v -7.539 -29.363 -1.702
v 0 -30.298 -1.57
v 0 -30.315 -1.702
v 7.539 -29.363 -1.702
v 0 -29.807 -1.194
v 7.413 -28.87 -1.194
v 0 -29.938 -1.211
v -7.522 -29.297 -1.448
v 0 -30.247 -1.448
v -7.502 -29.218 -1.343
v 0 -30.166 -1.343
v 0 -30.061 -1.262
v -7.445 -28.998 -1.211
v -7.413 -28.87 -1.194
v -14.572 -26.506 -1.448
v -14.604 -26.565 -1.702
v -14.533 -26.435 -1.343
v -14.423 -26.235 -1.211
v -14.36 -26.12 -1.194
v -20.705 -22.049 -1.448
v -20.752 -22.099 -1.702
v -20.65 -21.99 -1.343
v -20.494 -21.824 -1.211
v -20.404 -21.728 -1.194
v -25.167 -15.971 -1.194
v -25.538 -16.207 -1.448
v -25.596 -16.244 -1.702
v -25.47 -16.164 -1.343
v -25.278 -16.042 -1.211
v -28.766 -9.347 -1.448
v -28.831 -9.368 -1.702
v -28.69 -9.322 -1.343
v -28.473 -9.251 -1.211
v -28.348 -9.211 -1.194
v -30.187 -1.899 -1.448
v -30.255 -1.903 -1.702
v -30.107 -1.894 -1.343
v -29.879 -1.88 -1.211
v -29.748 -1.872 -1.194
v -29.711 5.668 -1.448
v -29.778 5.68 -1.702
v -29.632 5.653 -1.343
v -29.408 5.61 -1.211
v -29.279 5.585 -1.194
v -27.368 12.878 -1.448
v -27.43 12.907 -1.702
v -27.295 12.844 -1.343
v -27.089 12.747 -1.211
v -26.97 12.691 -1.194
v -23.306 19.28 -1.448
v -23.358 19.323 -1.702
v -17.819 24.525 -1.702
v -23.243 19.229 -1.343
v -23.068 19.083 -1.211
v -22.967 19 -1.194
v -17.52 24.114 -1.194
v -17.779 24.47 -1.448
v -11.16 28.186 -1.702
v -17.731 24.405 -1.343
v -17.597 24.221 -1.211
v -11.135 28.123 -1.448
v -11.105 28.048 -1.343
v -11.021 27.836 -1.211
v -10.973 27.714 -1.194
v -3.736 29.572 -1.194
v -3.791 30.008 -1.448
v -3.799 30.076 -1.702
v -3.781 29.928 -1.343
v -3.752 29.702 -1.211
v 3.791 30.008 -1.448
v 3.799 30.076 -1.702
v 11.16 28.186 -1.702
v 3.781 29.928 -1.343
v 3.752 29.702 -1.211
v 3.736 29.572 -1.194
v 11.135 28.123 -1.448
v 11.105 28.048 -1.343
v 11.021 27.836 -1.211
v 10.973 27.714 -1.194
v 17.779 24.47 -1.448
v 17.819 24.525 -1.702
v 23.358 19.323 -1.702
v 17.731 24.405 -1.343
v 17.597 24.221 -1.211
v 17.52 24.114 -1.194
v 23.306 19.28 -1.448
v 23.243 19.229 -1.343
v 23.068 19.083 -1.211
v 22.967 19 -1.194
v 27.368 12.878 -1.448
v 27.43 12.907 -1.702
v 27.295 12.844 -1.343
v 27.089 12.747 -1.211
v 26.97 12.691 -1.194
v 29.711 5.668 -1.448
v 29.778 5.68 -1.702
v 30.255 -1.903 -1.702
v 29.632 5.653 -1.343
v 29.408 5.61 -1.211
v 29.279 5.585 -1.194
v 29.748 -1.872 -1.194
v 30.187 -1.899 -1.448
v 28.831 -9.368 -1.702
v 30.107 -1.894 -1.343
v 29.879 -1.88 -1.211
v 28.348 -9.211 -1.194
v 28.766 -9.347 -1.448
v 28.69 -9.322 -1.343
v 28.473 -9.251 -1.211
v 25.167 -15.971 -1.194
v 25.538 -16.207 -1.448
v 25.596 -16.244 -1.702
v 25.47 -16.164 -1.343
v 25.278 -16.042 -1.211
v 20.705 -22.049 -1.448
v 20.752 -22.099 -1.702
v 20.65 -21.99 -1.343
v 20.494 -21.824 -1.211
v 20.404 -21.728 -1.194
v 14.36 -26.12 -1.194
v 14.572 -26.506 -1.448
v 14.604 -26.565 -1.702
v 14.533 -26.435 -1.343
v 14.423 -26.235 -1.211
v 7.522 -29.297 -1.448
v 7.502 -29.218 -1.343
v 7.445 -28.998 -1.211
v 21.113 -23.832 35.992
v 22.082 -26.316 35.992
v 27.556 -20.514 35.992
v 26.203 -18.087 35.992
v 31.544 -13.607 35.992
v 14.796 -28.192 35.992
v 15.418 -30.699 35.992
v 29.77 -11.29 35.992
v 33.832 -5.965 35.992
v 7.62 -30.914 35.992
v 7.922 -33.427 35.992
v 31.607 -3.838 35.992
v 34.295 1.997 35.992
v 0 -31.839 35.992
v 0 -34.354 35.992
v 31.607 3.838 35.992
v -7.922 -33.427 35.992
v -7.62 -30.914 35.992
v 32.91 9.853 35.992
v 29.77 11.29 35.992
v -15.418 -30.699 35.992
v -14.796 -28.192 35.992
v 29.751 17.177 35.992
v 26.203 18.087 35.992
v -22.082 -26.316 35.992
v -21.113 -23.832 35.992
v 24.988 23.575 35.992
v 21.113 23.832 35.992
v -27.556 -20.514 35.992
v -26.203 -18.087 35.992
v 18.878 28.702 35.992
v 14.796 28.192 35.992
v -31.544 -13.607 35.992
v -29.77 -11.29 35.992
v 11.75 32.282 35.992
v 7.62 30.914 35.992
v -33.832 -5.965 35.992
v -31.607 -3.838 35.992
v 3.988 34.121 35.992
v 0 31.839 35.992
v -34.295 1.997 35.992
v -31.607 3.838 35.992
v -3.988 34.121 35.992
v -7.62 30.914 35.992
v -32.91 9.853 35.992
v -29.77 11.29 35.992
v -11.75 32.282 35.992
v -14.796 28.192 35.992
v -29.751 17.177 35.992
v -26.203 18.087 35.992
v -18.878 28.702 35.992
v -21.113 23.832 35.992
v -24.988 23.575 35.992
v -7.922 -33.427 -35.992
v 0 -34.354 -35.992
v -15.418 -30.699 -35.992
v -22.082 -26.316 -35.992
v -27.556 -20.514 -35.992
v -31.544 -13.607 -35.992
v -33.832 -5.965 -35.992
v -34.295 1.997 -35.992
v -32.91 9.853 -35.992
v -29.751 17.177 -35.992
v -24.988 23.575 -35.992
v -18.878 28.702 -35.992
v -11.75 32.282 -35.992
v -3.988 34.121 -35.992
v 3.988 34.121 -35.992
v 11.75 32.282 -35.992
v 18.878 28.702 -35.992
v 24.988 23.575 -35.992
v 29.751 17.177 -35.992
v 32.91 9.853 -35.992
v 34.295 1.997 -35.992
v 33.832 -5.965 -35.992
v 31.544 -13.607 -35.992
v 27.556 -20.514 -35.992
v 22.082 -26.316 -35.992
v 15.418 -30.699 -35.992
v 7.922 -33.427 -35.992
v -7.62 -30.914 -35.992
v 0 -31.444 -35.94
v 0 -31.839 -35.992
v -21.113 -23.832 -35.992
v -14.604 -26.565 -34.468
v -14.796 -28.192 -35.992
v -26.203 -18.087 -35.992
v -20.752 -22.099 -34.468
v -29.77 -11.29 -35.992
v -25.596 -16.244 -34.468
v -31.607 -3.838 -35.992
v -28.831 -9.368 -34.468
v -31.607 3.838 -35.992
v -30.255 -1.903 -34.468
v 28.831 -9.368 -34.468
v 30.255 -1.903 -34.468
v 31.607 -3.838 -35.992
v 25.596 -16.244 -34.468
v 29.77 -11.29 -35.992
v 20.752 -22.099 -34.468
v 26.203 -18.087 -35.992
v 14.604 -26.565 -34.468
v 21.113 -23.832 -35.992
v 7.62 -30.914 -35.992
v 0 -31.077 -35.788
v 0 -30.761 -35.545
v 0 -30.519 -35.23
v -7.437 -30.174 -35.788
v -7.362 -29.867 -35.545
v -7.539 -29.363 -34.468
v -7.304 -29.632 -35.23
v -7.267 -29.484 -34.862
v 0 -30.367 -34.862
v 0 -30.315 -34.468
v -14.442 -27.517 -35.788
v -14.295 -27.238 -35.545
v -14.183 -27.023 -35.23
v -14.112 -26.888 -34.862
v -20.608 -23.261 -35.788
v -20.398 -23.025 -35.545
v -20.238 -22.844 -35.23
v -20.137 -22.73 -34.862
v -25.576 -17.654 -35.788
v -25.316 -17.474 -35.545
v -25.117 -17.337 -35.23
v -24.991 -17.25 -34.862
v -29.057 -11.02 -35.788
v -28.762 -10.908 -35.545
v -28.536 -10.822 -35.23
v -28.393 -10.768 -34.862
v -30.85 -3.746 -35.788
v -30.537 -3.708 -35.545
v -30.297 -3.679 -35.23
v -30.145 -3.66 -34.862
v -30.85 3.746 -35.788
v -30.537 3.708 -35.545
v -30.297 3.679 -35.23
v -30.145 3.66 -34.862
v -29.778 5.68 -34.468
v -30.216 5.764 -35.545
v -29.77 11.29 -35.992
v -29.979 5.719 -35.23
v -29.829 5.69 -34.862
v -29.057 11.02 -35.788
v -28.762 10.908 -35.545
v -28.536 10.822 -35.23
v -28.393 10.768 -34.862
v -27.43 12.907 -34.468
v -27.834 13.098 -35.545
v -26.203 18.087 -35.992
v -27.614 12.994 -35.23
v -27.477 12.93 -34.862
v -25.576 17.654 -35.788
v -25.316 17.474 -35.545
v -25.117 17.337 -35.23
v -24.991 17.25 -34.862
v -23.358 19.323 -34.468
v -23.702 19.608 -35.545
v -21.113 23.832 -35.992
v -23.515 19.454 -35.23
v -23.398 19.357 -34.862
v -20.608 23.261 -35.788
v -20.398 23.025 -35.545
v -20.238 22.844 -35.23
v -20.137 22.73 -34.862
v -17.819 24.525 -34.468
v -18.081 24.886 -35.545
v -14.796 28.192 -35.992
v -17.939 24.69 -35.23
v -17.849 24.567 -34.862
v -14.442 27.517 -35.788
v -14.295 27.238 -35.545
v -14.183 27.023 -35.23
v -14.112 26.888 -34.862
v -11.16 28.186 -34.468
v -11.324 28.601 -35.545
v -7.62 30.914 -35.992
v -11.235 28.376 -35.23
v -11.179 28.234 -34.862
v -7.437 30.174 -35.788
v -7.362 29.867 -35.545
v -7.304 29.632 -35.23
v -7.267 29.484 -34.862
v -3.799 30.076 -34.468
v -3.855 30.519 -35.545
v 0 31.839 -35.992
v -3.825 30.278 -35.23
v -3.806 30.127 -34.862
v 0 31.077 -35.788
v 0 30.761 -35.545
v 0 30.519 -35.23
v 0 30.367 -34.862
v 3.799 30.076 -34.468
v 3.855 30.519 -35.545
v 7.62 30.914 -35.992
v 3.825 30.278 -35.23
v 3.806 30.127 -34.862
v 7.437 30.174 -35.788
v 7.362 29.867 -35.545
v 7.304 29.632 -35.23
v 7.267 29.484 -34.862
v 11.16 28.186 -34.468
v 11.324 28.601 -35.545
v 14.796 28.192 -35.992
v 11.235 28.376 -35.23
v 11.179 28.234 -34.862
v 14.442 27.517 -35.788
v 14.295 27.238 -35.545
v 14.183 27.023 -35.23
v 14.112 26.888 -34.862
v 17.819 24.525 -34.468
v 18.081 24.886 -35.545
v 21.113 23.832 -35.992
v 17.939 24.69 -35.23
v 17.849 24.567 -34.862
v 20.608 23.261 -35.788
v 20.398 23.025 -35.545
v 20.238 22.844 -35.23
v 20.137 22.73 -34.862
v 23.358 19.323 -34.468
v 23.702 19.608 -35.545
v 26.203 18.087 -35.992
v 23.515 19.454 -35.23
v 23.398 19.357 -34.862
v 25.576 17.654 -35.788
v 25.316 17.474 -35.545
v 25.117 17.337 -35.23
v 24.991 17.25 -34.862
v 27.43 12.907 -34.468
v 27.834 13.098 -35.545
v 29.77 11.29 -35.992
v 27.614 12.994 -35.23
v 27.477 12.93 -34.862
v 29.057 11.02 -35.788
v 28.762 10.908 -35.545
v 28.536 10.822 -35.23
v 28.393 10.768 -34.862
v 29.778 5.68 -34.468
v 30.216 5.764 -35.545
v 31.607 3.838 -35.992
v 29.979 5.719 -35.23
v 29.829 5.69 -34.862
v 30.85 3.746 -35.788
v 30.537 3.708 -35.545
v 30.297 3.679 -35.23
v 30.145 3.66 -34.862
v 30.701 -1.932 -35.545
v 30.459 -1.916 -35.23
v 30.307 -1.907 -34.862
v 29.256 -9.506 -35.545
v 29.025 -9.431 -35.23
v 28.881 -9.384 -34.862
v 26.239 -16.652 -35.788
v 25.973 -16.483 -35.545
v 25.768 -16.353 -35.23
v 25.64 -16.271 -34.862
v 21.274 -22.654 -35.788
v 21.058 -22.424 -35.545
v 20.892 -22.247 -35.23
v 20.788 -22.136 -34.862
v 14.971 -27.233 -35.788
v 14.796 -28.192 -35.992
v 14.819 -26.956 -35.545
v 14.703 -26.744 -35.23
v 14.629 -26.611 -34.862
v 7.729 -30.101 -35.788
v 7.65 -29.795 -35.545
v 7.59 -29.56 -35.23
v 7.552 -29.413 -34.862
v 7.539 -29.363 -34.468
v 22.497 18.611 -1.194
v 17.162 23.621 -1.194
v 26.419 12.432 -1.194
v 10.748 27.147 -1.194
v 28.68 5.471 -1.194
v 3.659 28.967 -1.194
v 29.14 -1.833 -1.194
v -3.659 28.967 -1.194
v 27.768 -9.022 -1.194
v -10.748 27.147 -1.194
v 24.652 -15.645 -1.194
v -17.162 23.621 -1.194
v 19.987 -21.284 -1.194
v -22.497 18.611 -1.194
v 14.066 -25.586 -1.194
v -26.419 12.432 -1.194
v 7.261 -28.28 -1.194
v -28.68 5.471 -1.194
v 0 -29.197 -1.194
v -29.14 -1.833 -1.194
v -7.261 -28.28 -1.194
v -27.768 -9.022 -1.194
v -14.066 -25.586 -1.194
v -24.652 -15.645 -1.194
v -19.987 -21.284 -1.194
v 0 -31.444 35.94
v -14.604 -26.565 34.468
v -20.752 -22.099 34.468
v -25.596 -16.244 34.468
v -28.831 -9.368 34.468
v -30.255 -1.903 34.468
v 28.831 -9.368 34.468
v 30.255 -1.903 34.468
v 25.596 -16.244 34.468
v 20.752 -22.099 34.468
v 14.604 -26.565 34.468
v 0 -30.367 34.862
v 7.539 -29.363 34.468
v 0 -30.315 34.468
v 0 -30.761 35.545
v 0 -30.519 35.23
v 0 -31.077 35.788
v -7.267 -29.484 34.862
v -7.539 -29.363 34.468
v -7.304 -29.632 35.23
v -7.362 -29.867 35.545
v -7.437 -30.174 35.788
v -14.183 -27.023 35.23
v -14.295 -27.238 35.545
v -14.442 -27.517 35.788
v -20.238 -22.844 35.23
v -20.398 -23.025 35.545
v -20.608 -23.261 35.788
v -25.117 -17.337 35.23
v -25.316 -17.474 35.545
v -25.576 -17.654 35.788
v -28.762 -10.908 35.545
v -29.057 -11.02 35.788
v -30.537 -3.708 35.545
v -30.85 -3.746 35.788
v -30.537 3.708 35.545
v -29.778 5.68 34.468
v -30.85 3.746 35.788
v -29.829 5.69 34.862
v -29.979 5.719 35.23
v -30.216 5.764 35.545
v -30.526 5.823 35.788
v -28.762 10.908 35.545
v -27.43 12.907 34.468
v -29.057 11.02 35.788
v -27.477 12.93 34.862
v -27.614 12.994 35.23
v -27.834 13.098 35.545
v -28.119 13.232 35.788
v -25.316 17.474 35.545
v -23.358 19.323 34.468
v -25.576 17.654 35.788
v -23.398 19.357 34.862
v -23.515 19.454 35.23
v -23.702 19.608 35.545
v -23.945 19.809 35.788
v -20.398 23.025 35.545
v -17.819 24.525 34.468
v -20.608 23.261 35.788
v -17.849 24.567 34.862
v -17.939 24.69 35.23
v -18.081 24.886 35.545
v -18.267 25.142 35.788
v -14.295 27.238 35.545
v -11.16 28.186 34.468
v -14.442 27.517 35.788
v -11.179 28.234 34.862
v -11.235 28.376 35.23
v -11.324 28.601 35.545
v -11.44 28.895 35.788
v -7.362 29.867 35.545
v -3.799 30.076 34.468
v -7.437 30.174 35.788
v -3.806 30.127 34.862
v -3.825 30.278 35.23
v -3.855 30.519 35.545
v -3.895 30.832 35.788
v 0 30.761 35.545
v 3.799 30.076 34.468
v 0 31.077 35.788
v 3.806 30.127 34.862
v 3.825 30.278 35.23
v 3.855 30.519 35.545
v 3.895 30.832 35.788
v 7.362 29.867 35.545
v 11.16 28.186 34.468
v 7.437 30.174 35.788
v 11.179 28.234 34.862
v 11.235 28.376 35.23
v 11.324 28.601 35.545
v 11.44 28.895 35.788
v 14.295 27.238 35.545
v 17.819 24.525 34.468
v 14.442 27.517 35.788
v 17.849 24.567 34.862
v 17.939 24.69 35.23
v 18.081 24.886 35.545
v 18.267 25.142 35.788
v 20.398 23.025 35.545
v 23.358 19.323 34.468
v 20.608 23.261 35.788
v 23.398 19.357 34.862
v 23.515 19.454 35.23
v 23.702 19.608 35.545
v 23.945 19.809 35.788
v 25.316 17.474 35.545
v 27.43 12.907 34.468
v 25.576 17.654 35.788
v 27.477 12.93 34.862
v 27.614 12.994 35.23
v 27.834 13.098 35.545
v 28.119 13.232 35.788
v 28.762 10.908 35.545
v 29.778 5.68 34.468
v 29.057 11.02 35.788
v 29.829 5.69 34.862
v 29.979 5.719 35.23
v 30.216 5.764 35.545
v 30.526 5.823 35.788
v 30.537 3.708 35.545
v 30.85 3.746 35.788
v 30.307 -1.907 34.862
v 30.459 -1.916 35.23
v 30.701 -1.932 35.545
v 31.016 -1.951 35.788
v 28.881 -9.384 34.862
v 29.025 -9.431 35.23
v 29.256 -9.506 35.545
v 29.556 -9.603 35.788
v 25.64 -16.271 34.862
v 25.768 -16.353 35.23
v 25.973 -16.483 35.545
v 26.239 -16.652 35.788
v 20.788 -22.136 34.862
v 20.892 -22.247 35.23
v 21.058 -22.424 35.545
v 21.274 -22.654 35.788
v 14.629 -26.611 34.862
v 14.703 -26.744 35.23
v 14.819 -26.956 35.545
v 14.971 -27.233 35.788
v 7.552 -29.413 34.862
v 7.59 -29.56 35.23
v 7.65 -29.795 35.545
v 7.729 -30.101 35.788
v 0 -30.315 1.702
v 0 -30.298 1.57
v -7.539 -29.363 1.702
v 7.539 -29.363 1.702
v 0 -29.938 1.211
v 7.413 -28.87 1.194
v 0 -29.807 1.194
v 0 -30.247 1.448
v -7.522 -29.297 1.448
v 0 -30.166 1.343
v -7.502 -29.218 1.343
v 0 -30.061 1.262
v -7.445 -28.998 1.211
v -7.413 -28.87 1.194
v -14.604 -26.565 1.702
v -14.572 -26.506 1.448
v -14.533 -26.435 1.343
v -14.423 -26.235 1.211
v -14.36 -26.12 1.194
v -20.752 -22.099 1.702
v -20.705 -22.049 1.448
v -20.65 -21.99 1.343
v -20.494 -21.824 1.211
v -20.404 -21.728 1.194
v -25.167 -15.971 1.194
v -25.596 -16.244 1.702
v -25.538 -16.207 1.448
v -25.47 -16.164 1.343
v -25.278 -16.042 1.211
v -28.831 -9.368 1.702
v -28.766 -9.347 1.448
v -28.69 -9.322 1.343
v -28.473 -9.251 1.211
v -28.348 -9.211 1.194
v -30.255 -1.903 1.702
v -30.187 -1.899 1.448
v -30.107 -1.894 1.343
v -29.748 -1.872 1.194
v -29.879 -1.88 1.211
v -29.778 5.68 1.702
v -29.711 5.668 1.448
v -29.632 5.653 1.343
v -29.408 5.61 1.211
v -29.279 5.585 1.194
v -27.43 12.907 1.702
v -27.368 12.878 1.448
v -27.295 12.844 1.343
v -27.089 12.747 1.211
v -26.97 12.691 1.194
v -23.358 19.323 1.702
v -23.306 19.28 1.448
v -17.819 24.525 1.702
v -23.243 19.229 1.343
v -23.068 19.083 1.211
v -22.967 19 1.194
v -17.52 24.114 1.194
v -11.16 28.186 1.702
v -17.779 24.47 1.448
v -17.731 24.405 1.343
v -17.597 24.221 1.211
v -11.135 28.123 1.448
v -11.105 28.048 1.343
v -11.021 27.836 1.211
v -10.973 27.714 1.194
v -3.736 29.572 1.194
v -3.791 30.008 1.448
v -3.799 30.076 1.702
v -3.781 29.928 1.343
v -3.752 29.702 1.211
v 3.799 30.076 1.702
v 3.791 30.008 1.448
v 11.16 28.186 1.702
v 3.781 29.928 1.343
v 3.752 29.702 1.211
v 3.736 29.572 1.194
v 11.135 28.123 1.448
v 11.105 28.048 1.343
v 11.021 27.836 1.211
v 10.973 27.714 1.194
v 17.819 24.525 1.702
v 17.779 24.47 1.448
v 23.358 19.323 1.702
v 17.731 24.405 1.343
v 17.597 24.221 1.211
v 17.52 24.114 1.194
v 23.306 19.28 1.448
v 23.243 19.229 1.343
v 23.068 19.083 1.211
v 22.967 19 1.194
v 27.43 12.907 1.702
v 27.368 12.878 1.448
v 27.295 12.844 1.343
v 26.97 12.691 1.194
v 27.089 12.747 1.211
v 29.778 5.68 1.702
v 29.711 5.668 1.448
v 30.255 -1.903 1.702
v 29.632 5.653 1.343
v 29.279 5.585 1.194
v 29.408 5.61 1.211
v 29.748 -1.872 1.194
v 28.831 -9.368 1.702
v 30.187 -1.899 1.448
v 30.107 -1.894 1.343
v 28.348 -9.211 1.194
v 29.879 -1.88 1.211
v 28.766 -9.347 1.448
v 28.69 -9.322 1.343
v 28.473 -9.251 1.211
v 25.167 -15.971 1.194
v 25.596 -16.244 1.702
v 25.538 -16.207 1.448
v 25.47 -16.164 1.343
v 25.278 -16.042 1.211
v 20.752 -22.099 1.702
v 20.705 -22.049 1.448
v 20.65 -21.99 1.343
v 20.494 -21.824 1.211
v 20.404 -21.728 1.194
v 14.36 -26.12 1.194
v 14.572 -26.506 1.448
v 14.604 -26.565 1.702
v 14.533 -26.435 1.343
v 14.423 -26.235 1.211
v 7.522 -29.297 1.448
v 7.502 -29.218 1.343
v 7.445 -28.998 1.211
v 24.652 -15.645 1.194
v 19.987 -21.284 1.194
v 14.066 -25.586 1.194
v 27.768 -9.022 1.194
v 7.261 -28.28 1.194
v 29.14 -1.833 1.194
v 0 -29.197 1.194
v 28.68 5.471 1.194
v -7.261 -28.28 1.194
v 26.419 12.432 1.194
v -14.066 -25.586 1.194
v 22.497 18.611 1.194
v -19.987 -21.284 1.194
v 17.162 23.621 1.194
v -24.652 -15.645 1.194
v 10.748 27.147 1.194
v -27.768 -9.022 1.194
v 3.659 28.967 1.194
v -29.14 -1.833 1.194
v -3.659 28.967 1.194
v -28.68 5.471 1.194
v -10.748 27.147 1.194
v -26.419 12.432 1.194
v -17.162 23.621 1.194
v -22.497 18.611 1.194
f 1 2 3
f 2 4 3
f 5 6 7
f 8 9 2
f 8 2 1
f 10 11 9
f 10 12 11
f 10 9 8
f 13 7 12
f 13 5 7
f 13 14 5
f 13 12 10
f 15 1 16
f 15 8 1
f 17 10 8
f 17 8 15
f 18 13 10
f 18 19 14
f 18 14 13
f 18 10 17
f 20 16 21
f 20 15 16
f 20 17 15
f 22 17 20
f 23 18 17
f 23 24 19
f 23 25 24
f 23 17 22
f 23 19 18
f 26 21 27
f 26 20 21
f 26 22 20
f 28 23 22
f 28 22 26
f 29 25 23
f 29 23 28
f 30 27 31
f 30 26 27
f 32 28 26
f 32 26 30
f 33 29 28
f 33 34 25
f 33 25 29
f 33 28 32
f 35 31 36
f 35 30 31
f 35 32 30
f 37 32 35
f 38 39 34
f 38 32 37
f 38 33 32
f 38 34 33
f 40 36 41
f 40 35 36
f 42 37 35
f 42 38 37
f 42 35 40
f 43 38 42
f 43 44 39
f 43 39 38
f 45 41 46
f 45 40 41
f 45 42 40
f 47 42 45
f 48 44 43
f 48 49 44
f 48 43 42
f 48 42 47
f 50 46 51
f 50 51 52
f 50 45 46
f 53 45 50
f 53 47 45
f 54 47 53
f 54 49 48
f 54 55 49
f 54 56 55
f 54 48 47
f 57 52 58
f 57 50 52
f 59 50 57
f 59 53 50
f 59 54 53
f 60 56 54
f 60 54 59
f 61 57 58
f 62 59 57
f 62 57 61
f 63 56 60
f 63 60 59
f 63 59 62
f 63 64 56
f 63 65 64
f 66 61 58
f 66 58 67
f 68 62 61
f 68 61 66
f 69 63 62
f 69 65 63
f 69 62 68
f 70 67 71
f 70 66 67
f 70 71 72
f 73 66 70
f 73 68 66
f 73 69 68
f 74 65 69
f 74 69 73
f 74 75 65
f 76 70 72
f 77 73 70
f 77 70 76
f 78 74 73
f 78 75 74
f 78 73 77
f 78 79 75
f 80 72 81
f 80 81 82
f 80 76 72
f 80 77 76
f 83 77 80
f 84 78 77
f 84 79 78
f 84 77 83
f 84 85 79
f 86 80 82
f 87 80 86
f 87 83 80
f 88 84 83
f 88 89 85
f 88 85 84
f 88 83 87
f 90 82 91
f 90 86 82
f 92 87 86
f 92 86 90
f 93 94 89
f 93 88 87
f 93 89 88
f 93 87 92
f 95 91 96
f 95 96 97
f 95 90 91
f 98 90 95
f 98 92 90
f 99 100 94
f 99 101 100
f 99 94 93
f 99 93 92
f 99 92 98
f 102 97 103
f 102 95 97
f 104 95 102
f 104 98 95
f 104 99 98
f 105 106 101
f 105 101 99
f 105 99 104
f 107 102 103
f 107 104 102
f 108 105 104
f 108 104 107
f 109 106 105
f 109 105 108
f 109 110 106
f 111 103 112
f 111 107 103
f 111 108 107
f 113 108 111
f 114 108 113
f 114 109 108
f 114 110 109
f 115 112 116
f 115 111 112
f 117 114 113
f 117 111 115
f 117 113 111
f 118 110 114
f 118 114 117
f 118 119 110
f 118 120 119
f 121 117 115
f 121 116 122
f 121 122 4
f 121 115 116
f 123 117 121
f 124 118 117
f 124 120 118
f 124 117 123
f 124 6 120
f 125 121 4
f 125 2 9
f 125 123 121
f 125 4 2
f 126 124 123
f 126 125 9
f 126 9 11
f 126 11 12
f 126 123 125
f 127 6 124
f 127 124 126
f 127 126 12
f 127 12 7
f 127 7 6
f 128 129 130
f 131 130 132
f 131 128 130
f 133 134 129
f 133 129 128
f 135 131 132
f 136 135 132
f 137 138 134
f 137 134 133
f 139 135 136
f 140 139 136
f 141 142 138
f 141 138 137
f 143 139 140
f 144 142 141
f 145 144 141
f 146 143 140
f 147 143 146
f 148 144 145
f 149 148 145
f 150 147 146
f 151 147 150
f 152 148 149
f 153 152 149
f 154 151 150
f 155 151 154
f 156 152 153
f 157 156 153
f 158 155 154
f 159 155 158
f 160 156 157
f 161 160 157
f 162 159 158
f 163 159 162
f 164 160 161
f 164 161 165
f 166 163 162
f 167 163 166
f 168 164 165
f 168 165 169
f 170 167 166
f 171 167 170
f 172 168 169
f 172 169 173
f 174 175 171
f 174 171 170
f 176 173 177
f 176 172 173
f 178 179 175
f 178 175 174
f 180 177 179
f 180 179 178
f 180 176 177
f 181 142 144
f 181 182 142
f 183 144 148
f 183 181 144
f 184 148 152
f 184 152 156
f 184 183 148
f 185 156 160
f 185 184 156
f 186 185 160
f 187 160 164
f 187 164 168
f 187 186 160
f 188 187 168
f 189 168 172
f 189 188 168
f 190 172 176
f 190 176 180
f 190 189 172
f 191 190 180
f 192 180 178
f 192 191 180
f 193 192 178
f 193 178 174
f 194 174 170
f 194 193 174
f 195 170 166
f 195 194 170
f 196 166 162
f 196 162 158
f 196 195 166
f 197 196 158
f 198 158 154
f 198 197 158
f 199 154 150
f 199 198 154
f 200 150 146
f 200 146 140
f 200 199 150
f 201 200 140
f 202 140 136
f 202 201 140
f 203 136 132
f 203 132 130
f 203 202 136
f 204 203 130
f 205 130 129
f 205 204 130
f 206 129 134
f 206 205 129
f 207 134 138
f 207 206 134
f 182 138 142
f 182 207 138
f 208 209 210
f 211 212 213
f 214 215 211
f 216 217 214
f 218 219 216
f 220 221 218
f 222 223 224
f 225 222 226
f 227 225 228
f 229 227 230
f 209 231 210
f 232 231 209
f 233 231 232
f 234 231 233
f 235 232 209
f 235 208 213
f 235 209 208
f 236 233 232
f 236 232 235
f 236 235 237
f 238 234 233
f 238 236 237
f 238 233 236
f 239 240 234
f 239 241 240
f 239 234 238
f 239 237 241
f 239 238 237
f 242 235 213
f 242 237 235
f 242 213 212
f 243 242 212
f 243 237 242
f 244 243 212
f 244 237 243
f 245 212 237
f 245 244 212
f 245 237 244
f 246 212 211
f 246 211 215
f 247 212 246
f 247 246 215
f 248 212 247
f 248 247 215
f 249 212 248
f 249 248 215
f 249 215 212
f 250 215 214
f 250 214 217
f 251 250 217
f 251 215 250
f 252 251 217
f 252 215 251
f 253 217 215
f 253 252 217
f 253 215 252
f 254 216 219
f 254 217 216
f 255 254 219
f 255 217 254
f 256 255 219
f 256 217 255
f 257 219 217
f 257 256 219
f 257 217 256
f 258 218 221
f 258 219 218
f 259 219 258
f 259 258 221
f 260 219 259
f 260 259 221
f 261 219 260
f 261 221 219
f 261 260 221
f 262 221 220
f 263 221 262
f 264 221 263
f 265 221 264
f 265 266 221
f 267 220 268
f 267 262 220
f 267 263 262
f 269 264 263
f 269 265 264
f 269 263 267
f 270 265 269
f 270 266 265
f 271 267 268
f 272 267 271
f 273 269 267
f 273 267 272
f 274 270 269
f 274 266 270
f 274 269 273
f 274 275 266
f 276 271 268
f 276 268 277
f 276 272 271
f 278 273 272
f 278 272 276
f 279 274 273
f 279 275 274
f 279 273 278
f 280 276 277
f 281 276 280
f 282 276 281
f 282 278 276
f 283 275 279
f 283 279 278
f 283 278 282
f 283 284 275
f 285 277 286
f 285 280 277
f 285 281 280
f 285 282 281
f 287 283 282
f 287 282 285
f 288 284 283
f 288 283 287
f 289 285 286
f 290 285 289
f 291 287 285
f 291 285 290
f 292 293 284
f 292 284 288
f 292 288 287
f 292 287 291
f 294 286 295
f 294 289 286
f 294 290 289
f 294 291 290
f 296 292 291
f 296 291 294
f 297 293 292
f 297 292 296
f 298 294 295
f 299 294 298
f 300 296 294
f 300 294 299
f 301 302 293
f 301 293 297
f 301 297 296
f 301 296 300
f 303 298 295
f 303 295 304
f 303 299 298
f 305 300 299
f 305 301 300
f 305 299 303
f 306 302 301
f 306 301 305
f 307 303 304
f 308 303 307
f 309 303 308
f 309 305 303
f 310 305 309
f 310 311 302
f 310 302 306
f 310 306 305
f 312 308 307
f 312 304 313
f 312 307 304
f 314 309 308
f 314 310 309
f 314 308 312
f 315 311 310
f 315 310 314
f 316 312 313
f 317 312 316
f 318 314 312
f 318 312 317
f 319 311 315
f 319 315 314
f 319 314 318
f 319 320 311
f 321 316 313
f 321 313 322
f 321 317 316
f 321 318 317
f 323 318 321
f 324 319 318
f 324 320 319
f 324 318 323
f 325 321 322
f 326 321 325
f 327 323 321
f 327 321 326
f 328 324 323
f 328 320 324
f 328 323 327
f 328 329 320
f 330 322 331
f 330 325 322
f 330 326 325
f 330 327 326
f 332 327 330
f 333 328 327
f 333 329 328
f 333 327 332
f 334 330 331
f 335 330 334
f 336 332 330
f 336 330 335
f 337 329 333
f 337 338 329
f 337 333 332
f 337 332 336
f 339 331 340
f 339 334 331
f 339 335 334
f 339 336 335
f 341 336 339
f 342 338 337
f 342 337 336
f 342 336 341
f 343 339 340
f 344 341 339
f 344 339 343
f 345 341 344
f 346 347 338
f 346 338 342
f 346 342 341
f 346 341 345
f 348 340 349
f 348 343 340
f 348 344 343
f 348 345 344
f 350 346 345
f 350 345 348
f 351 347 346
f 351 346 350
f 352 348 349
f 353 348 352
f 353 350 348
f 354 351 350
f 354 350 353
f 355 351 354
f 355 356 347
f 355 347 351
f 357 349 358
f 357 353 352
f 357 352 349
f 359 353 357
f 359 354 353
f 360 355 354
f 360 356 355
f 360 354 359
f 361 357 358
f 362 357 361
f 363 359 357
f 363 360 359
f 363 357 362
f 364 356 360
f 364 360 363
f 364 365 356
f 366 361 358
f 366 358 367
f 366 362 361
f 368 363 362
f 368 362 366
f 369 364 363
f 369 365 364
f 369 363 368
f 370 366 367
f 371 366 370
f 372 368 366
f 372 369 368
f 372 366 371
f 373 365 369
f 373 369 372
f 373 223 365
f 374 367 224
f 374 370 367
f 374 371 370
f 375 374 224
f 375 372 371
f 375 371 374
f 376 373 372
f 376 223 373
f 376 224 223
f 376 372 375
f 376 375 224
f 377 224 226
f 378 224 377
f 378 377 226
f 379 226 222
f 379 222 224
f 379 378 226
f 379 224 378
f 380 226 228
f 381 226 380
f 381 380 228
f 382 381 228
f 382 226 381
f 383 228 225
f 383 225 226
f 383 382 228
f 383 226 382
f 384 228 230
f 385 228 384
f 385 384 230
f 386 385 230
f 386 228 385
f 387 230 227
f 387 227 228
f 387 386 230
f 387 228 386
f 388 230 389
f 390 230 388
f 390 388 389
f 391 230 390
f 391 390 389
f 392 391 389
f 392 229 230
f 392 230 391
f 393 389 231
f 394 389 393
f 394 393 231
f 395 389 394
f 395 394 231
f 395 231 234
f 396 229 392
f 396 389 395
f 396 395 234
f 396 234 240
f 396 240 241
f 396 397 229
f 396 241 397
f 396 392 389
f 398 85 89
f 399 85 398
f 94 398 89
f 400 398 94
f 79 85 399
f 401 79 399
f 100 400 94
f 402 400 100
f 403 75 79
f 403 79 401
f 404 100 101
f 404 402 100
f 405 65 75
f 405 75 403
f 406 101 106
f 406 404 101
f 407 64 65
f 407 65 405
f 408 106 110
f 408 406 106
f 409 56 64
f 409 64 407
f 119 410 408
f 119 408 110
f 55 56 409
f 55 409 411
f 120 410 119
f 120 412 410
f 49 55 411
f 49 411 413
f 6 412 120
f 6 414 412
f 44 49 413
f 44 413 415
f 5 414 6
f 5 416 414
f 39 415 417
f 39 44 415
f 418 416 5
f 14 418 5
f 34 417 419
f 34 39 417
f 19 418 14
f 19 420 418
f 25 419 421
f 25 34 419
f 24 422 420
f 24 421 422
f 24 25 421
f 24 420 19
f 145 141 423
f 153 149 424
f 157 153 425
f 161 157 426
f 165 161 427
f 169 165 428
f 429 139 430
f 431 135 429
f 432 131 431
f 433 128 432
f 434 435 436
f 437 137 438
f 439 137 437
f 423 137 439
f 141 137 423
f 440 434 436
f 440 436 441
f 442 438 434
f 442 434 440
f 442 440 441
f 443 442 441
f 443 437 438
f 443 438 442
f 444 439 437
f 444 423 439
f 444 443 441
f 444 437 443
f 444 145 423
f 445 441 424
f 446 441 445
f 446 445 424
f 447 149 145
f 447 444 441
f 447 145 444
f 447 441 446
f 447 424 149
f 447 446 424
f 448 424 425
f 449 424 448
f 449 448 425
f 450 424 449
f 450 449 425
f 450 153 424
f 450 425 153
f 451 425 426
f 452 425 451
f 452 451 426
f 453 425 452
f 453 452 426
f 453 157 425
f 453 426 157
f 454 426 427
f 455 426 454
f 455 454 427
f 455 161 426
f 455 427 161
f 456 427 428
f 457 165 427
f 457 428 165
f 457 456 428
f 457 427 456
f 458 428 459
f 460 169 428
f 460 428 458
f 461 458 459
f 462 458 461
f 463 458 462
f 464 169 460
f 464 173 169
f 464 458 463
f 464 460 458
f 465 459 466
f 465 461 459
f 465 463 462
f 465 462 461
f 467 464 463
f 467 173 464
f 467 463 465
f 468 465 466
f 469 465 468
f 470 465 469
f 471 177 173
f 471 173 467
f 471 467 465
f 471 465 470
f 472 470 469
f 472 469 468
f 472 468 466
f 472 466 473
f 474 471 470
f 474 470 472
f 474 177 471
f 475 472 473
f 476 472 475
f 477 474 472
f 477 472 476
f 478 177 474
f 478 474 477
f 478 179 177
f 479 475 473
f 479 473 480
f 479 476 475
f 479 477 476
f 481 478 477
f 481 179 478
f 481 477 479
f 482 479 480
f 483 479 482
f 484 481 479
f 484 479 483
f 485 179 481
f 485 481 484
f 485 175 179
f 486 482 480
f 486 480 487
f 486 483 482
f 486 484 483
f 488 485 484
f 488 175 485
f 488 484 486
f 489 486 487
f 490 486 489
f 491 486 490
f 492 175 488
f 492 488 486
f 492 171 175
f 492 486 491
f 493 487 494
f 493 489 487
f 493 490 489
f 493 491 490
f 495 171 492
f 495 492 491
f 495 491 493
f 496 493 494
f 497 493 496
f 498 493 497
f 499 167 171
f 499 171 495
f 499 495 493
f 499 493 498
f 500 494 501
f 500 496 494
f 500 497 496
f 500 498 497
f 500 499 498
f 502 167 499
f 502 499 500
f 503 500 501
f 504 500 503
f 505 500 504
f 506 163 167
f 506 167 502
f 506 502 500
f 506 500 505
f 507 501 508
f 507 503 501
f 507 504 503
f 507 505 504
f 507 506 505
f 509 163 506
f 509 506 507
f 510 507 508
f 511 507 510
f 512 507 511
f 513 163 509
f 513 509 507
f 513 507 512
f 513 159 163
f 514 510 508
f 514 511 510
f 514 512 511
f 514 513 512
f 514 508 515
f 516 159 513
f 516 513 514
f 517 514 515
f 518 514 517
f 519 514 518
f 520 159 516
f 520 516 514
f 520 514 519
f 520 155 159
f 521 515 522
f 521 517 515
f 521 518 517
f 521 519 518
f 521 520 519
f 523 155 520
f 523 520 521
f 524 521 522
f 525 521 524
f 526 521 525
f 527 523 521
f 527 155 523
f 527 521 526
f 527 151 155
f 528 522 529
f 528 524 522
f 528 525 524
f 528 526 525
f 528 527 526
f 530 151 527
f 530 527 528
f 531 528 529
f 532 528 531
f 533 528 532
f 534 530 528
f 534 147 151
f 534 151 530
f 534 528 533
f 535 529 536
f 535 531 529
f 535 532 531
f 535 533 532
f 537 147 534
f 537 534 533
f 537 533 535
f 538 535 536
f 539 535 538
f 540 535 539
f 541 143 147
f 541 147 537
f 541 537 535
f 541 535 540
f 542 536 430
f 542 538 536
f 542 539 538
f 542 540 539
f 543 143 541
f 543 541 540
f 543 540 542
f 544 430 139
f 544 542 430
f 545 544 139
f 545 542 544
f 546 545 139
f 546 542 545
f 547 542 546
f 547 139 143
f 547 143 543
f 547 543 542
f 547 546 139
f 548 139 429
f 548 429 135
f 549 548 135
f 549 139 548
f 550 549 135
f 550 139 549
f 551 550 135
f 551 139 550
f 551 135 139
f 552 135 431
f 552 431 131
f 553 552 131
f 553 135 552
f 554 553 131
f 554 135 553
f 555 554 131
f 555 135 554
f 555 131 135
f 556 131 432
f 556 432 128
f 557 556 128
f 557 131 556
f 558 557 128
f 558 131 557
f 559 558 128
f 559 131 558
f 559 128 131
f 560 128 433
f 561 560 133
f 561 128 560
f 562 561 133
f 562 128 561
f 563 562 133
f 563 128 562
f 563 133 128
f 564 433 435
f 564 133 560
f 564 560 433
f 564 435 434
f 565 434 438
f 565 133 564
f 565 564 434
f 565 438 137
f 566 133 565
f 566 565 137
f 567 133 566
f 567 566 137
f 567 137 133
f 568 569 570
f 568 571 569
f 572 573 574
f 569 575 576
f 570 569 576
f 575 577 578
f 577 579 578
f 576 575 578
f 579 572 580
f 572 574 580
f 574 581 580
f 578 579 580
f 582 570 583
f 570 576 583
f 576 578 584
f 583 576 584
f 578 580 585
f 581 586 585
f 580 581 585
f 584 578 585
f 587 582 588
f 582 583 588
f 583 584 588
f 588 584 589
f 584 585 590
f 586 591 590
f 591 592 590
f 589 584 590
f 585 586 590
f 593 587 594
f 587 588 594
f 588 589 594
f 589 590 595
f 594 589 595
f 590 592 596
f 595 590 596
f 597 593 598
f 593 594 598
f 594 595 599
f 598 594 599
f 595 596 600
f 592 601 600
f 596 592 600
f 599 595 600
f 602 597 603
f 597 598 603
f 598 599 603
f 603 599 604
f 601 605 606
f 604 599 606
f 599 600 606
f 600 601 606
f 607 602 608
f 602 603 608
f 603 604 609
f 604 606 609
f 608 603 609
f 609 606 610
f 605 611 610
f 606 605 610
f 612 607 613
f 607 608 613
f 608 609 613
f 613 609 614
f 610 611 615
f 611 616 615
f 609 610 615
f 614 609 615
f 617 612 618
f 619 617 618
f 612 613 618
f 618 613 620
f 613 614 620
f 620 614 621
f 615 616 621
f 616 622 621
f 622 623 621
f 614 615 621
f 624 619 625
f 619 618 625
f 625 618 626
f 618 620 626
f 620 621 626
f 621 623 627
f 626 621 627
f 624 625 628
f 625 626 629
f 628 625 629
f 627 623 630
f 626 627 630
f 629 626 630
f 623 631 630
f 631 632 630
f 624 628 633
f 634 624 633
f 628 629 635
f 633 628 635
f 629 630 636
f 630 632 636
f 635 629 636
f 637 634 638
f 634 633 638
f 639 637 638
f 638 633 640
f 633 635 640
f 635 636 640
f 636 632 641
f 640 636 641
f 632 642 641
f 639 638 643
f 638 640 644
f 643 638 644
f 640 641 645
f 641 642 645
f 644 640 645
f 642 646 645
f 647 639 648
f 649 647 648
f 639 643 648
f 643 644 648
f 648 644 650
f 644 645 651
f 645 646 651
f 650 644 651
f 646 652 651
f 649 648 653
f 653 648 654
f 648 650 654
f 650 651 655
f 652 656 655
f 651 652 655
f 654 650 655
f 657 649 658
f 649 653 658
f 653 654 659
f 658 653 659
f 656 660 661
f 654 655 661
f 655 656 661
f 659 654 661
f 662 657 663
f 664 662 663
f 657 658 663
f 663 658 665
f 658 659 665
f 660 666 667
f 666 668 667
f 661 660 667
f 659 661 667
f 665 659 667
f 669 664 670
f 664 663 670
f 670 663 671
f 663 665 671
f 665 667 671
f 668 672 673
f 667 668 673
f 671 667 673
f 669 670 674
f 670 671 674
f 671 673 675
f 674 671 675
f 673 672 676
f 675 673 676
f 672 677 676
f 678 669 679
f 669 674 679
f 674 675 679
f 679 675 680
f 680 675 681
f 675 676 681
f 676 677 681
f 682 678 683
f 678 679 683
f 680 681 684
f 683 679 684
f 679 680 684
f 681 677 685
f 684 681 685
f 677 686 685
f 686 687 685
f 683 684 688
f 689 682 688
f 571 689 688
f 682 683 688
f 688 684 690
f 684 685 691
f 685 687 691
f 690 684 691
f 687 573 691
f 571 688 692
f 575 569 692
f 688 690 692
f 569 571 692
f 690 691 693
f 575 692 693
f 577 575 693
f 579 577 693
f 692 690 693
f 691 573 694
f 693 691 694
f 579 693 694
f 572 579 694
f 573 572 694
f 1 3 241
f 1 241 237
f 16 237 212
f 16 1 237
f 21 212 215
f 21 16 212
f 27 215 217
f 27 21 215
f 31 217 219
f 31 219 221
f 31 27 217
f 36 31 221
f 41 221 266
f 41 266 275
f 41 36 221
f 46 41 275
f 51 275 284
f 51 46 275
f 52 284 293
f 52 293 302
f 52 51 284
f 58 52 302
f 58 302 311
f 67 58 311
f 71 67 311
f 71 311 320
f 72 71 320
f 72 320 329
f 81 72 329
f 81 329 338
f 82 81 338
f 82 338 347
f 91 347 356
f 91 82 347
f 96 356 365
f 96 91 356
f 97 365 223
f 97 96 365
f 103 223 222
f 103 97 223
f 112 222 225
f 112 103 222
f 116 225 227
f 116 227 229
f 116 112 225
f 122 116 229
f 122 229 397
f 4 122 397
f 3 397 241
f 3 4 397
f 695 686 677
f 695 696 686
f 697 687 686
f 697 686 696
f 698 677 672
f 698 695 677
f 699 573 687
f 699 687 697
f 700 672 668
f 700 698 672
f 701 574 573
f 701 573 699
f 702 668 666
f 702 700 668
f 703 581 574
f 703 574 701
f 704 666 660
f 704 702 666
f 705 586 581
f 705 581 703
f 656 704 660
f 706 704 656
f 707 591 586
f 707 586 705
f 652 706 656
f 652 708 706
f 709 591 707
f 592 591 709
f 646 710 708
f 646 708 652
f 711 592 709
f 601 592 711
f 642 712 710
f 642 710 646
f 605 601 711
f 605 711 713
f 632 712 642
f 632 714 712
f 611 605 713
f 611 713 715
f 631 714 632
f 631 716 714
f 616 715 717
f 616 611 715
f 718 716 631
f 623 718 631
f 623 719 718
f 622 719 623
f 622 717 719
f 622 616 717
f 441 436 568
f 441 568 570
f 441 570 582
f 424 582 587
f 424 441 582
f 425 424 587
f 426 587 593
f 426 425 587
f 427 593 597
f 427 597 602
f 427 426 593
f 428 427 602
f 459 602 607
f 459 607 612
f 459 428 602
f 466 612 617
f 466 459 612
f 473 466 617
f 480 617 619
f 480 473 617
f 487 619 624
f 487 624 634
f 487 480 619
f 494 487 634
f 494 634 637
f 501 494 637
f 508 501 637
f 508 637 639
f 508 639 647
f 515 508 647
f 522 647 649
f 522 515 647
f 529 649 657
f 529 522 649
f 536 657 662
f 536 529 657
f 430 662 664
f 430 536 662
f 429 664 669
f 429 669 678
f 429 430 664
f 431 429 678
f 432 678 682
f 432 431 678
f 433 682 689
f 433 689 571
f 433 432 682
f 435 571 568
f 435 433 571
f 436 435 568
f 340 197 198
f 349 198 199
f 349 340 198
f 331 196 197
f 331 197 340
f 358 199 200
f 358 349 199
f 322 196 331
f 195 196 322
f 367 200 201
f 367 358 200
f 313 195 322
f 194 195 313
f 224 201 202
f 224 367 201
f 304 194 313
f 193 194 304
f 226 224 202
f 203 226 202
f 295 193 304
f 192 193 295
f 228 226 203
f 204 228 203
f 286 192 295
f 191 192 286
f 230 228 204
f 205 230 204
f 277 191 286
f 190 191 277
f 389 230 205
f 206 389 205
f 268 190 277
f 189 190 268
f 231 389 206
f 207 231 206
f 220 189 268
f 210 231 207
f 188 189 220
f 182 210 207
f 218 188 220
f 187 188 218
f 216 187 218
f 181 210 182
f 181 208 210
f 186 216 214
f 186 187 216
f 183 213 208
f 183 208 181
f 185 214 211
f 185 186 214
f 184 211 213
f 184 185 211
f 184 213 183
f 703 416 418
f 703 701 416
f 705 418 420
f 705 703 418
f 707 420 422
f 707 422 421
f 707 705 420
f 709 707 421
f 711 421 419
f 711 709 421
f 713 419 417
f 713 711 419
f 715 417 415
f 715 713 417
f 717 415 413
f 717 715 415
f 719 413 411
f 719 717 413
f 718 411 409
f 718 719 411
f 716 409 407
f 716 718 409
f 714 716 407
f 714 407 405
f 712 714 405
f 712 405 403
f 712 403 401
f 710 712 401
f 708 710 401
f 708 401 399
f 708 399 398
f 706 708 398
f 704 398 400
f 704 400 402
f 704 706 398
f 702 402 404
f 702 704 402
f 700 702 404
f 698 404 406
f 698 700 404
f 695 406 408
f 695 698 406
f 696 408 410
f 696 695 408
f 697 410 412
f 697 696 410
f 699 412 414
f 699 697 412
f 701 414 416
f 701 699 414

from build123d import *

# Parameters (mm, degrees)
FILLET1_R = 1.524
FILLET2_R = 0.508


with BuildPart() as part:
    # Sketch3 → Revolve1 (revolve)
    with BuildSketch(Plane(origin=(0, 0, 0), x_dir=(0, 0, -1), z_dir=(1, 0, 0))):
        Polygon((-35.9918, -34.3535), (35.9918, -34.3535), (35.9918, -30.3149), (1.1938, -30.3149), (1.1938, -29.1973), (-1.1938, -29.1973), (-1.1938, -30.3149), (-35.9918, -30.3149), align=None)
    revolve(axis=Axis((0, 0, 35.9918), (0, 0, -1)))

    # Fillet1
    fillet1_edges = [part.edges().sort_by_distance(p)[0] for p in [
        (0, 30.3149, -35.9918),
        (0, 30.3149, 35.9918),
    ]]
    fillet(fillet1_edges, radius=FILLET1_R)

    # Fillet2
    fillet2_edges = [part.edges().sort_by_distance(p)[0] for p in [
        (0, 30.3149, -1.1938),
        (0, 30.3149, 1.1938),
    ]]
    fillet(fillet2_edges, radius=FILLET2_R)


solid = part.part
